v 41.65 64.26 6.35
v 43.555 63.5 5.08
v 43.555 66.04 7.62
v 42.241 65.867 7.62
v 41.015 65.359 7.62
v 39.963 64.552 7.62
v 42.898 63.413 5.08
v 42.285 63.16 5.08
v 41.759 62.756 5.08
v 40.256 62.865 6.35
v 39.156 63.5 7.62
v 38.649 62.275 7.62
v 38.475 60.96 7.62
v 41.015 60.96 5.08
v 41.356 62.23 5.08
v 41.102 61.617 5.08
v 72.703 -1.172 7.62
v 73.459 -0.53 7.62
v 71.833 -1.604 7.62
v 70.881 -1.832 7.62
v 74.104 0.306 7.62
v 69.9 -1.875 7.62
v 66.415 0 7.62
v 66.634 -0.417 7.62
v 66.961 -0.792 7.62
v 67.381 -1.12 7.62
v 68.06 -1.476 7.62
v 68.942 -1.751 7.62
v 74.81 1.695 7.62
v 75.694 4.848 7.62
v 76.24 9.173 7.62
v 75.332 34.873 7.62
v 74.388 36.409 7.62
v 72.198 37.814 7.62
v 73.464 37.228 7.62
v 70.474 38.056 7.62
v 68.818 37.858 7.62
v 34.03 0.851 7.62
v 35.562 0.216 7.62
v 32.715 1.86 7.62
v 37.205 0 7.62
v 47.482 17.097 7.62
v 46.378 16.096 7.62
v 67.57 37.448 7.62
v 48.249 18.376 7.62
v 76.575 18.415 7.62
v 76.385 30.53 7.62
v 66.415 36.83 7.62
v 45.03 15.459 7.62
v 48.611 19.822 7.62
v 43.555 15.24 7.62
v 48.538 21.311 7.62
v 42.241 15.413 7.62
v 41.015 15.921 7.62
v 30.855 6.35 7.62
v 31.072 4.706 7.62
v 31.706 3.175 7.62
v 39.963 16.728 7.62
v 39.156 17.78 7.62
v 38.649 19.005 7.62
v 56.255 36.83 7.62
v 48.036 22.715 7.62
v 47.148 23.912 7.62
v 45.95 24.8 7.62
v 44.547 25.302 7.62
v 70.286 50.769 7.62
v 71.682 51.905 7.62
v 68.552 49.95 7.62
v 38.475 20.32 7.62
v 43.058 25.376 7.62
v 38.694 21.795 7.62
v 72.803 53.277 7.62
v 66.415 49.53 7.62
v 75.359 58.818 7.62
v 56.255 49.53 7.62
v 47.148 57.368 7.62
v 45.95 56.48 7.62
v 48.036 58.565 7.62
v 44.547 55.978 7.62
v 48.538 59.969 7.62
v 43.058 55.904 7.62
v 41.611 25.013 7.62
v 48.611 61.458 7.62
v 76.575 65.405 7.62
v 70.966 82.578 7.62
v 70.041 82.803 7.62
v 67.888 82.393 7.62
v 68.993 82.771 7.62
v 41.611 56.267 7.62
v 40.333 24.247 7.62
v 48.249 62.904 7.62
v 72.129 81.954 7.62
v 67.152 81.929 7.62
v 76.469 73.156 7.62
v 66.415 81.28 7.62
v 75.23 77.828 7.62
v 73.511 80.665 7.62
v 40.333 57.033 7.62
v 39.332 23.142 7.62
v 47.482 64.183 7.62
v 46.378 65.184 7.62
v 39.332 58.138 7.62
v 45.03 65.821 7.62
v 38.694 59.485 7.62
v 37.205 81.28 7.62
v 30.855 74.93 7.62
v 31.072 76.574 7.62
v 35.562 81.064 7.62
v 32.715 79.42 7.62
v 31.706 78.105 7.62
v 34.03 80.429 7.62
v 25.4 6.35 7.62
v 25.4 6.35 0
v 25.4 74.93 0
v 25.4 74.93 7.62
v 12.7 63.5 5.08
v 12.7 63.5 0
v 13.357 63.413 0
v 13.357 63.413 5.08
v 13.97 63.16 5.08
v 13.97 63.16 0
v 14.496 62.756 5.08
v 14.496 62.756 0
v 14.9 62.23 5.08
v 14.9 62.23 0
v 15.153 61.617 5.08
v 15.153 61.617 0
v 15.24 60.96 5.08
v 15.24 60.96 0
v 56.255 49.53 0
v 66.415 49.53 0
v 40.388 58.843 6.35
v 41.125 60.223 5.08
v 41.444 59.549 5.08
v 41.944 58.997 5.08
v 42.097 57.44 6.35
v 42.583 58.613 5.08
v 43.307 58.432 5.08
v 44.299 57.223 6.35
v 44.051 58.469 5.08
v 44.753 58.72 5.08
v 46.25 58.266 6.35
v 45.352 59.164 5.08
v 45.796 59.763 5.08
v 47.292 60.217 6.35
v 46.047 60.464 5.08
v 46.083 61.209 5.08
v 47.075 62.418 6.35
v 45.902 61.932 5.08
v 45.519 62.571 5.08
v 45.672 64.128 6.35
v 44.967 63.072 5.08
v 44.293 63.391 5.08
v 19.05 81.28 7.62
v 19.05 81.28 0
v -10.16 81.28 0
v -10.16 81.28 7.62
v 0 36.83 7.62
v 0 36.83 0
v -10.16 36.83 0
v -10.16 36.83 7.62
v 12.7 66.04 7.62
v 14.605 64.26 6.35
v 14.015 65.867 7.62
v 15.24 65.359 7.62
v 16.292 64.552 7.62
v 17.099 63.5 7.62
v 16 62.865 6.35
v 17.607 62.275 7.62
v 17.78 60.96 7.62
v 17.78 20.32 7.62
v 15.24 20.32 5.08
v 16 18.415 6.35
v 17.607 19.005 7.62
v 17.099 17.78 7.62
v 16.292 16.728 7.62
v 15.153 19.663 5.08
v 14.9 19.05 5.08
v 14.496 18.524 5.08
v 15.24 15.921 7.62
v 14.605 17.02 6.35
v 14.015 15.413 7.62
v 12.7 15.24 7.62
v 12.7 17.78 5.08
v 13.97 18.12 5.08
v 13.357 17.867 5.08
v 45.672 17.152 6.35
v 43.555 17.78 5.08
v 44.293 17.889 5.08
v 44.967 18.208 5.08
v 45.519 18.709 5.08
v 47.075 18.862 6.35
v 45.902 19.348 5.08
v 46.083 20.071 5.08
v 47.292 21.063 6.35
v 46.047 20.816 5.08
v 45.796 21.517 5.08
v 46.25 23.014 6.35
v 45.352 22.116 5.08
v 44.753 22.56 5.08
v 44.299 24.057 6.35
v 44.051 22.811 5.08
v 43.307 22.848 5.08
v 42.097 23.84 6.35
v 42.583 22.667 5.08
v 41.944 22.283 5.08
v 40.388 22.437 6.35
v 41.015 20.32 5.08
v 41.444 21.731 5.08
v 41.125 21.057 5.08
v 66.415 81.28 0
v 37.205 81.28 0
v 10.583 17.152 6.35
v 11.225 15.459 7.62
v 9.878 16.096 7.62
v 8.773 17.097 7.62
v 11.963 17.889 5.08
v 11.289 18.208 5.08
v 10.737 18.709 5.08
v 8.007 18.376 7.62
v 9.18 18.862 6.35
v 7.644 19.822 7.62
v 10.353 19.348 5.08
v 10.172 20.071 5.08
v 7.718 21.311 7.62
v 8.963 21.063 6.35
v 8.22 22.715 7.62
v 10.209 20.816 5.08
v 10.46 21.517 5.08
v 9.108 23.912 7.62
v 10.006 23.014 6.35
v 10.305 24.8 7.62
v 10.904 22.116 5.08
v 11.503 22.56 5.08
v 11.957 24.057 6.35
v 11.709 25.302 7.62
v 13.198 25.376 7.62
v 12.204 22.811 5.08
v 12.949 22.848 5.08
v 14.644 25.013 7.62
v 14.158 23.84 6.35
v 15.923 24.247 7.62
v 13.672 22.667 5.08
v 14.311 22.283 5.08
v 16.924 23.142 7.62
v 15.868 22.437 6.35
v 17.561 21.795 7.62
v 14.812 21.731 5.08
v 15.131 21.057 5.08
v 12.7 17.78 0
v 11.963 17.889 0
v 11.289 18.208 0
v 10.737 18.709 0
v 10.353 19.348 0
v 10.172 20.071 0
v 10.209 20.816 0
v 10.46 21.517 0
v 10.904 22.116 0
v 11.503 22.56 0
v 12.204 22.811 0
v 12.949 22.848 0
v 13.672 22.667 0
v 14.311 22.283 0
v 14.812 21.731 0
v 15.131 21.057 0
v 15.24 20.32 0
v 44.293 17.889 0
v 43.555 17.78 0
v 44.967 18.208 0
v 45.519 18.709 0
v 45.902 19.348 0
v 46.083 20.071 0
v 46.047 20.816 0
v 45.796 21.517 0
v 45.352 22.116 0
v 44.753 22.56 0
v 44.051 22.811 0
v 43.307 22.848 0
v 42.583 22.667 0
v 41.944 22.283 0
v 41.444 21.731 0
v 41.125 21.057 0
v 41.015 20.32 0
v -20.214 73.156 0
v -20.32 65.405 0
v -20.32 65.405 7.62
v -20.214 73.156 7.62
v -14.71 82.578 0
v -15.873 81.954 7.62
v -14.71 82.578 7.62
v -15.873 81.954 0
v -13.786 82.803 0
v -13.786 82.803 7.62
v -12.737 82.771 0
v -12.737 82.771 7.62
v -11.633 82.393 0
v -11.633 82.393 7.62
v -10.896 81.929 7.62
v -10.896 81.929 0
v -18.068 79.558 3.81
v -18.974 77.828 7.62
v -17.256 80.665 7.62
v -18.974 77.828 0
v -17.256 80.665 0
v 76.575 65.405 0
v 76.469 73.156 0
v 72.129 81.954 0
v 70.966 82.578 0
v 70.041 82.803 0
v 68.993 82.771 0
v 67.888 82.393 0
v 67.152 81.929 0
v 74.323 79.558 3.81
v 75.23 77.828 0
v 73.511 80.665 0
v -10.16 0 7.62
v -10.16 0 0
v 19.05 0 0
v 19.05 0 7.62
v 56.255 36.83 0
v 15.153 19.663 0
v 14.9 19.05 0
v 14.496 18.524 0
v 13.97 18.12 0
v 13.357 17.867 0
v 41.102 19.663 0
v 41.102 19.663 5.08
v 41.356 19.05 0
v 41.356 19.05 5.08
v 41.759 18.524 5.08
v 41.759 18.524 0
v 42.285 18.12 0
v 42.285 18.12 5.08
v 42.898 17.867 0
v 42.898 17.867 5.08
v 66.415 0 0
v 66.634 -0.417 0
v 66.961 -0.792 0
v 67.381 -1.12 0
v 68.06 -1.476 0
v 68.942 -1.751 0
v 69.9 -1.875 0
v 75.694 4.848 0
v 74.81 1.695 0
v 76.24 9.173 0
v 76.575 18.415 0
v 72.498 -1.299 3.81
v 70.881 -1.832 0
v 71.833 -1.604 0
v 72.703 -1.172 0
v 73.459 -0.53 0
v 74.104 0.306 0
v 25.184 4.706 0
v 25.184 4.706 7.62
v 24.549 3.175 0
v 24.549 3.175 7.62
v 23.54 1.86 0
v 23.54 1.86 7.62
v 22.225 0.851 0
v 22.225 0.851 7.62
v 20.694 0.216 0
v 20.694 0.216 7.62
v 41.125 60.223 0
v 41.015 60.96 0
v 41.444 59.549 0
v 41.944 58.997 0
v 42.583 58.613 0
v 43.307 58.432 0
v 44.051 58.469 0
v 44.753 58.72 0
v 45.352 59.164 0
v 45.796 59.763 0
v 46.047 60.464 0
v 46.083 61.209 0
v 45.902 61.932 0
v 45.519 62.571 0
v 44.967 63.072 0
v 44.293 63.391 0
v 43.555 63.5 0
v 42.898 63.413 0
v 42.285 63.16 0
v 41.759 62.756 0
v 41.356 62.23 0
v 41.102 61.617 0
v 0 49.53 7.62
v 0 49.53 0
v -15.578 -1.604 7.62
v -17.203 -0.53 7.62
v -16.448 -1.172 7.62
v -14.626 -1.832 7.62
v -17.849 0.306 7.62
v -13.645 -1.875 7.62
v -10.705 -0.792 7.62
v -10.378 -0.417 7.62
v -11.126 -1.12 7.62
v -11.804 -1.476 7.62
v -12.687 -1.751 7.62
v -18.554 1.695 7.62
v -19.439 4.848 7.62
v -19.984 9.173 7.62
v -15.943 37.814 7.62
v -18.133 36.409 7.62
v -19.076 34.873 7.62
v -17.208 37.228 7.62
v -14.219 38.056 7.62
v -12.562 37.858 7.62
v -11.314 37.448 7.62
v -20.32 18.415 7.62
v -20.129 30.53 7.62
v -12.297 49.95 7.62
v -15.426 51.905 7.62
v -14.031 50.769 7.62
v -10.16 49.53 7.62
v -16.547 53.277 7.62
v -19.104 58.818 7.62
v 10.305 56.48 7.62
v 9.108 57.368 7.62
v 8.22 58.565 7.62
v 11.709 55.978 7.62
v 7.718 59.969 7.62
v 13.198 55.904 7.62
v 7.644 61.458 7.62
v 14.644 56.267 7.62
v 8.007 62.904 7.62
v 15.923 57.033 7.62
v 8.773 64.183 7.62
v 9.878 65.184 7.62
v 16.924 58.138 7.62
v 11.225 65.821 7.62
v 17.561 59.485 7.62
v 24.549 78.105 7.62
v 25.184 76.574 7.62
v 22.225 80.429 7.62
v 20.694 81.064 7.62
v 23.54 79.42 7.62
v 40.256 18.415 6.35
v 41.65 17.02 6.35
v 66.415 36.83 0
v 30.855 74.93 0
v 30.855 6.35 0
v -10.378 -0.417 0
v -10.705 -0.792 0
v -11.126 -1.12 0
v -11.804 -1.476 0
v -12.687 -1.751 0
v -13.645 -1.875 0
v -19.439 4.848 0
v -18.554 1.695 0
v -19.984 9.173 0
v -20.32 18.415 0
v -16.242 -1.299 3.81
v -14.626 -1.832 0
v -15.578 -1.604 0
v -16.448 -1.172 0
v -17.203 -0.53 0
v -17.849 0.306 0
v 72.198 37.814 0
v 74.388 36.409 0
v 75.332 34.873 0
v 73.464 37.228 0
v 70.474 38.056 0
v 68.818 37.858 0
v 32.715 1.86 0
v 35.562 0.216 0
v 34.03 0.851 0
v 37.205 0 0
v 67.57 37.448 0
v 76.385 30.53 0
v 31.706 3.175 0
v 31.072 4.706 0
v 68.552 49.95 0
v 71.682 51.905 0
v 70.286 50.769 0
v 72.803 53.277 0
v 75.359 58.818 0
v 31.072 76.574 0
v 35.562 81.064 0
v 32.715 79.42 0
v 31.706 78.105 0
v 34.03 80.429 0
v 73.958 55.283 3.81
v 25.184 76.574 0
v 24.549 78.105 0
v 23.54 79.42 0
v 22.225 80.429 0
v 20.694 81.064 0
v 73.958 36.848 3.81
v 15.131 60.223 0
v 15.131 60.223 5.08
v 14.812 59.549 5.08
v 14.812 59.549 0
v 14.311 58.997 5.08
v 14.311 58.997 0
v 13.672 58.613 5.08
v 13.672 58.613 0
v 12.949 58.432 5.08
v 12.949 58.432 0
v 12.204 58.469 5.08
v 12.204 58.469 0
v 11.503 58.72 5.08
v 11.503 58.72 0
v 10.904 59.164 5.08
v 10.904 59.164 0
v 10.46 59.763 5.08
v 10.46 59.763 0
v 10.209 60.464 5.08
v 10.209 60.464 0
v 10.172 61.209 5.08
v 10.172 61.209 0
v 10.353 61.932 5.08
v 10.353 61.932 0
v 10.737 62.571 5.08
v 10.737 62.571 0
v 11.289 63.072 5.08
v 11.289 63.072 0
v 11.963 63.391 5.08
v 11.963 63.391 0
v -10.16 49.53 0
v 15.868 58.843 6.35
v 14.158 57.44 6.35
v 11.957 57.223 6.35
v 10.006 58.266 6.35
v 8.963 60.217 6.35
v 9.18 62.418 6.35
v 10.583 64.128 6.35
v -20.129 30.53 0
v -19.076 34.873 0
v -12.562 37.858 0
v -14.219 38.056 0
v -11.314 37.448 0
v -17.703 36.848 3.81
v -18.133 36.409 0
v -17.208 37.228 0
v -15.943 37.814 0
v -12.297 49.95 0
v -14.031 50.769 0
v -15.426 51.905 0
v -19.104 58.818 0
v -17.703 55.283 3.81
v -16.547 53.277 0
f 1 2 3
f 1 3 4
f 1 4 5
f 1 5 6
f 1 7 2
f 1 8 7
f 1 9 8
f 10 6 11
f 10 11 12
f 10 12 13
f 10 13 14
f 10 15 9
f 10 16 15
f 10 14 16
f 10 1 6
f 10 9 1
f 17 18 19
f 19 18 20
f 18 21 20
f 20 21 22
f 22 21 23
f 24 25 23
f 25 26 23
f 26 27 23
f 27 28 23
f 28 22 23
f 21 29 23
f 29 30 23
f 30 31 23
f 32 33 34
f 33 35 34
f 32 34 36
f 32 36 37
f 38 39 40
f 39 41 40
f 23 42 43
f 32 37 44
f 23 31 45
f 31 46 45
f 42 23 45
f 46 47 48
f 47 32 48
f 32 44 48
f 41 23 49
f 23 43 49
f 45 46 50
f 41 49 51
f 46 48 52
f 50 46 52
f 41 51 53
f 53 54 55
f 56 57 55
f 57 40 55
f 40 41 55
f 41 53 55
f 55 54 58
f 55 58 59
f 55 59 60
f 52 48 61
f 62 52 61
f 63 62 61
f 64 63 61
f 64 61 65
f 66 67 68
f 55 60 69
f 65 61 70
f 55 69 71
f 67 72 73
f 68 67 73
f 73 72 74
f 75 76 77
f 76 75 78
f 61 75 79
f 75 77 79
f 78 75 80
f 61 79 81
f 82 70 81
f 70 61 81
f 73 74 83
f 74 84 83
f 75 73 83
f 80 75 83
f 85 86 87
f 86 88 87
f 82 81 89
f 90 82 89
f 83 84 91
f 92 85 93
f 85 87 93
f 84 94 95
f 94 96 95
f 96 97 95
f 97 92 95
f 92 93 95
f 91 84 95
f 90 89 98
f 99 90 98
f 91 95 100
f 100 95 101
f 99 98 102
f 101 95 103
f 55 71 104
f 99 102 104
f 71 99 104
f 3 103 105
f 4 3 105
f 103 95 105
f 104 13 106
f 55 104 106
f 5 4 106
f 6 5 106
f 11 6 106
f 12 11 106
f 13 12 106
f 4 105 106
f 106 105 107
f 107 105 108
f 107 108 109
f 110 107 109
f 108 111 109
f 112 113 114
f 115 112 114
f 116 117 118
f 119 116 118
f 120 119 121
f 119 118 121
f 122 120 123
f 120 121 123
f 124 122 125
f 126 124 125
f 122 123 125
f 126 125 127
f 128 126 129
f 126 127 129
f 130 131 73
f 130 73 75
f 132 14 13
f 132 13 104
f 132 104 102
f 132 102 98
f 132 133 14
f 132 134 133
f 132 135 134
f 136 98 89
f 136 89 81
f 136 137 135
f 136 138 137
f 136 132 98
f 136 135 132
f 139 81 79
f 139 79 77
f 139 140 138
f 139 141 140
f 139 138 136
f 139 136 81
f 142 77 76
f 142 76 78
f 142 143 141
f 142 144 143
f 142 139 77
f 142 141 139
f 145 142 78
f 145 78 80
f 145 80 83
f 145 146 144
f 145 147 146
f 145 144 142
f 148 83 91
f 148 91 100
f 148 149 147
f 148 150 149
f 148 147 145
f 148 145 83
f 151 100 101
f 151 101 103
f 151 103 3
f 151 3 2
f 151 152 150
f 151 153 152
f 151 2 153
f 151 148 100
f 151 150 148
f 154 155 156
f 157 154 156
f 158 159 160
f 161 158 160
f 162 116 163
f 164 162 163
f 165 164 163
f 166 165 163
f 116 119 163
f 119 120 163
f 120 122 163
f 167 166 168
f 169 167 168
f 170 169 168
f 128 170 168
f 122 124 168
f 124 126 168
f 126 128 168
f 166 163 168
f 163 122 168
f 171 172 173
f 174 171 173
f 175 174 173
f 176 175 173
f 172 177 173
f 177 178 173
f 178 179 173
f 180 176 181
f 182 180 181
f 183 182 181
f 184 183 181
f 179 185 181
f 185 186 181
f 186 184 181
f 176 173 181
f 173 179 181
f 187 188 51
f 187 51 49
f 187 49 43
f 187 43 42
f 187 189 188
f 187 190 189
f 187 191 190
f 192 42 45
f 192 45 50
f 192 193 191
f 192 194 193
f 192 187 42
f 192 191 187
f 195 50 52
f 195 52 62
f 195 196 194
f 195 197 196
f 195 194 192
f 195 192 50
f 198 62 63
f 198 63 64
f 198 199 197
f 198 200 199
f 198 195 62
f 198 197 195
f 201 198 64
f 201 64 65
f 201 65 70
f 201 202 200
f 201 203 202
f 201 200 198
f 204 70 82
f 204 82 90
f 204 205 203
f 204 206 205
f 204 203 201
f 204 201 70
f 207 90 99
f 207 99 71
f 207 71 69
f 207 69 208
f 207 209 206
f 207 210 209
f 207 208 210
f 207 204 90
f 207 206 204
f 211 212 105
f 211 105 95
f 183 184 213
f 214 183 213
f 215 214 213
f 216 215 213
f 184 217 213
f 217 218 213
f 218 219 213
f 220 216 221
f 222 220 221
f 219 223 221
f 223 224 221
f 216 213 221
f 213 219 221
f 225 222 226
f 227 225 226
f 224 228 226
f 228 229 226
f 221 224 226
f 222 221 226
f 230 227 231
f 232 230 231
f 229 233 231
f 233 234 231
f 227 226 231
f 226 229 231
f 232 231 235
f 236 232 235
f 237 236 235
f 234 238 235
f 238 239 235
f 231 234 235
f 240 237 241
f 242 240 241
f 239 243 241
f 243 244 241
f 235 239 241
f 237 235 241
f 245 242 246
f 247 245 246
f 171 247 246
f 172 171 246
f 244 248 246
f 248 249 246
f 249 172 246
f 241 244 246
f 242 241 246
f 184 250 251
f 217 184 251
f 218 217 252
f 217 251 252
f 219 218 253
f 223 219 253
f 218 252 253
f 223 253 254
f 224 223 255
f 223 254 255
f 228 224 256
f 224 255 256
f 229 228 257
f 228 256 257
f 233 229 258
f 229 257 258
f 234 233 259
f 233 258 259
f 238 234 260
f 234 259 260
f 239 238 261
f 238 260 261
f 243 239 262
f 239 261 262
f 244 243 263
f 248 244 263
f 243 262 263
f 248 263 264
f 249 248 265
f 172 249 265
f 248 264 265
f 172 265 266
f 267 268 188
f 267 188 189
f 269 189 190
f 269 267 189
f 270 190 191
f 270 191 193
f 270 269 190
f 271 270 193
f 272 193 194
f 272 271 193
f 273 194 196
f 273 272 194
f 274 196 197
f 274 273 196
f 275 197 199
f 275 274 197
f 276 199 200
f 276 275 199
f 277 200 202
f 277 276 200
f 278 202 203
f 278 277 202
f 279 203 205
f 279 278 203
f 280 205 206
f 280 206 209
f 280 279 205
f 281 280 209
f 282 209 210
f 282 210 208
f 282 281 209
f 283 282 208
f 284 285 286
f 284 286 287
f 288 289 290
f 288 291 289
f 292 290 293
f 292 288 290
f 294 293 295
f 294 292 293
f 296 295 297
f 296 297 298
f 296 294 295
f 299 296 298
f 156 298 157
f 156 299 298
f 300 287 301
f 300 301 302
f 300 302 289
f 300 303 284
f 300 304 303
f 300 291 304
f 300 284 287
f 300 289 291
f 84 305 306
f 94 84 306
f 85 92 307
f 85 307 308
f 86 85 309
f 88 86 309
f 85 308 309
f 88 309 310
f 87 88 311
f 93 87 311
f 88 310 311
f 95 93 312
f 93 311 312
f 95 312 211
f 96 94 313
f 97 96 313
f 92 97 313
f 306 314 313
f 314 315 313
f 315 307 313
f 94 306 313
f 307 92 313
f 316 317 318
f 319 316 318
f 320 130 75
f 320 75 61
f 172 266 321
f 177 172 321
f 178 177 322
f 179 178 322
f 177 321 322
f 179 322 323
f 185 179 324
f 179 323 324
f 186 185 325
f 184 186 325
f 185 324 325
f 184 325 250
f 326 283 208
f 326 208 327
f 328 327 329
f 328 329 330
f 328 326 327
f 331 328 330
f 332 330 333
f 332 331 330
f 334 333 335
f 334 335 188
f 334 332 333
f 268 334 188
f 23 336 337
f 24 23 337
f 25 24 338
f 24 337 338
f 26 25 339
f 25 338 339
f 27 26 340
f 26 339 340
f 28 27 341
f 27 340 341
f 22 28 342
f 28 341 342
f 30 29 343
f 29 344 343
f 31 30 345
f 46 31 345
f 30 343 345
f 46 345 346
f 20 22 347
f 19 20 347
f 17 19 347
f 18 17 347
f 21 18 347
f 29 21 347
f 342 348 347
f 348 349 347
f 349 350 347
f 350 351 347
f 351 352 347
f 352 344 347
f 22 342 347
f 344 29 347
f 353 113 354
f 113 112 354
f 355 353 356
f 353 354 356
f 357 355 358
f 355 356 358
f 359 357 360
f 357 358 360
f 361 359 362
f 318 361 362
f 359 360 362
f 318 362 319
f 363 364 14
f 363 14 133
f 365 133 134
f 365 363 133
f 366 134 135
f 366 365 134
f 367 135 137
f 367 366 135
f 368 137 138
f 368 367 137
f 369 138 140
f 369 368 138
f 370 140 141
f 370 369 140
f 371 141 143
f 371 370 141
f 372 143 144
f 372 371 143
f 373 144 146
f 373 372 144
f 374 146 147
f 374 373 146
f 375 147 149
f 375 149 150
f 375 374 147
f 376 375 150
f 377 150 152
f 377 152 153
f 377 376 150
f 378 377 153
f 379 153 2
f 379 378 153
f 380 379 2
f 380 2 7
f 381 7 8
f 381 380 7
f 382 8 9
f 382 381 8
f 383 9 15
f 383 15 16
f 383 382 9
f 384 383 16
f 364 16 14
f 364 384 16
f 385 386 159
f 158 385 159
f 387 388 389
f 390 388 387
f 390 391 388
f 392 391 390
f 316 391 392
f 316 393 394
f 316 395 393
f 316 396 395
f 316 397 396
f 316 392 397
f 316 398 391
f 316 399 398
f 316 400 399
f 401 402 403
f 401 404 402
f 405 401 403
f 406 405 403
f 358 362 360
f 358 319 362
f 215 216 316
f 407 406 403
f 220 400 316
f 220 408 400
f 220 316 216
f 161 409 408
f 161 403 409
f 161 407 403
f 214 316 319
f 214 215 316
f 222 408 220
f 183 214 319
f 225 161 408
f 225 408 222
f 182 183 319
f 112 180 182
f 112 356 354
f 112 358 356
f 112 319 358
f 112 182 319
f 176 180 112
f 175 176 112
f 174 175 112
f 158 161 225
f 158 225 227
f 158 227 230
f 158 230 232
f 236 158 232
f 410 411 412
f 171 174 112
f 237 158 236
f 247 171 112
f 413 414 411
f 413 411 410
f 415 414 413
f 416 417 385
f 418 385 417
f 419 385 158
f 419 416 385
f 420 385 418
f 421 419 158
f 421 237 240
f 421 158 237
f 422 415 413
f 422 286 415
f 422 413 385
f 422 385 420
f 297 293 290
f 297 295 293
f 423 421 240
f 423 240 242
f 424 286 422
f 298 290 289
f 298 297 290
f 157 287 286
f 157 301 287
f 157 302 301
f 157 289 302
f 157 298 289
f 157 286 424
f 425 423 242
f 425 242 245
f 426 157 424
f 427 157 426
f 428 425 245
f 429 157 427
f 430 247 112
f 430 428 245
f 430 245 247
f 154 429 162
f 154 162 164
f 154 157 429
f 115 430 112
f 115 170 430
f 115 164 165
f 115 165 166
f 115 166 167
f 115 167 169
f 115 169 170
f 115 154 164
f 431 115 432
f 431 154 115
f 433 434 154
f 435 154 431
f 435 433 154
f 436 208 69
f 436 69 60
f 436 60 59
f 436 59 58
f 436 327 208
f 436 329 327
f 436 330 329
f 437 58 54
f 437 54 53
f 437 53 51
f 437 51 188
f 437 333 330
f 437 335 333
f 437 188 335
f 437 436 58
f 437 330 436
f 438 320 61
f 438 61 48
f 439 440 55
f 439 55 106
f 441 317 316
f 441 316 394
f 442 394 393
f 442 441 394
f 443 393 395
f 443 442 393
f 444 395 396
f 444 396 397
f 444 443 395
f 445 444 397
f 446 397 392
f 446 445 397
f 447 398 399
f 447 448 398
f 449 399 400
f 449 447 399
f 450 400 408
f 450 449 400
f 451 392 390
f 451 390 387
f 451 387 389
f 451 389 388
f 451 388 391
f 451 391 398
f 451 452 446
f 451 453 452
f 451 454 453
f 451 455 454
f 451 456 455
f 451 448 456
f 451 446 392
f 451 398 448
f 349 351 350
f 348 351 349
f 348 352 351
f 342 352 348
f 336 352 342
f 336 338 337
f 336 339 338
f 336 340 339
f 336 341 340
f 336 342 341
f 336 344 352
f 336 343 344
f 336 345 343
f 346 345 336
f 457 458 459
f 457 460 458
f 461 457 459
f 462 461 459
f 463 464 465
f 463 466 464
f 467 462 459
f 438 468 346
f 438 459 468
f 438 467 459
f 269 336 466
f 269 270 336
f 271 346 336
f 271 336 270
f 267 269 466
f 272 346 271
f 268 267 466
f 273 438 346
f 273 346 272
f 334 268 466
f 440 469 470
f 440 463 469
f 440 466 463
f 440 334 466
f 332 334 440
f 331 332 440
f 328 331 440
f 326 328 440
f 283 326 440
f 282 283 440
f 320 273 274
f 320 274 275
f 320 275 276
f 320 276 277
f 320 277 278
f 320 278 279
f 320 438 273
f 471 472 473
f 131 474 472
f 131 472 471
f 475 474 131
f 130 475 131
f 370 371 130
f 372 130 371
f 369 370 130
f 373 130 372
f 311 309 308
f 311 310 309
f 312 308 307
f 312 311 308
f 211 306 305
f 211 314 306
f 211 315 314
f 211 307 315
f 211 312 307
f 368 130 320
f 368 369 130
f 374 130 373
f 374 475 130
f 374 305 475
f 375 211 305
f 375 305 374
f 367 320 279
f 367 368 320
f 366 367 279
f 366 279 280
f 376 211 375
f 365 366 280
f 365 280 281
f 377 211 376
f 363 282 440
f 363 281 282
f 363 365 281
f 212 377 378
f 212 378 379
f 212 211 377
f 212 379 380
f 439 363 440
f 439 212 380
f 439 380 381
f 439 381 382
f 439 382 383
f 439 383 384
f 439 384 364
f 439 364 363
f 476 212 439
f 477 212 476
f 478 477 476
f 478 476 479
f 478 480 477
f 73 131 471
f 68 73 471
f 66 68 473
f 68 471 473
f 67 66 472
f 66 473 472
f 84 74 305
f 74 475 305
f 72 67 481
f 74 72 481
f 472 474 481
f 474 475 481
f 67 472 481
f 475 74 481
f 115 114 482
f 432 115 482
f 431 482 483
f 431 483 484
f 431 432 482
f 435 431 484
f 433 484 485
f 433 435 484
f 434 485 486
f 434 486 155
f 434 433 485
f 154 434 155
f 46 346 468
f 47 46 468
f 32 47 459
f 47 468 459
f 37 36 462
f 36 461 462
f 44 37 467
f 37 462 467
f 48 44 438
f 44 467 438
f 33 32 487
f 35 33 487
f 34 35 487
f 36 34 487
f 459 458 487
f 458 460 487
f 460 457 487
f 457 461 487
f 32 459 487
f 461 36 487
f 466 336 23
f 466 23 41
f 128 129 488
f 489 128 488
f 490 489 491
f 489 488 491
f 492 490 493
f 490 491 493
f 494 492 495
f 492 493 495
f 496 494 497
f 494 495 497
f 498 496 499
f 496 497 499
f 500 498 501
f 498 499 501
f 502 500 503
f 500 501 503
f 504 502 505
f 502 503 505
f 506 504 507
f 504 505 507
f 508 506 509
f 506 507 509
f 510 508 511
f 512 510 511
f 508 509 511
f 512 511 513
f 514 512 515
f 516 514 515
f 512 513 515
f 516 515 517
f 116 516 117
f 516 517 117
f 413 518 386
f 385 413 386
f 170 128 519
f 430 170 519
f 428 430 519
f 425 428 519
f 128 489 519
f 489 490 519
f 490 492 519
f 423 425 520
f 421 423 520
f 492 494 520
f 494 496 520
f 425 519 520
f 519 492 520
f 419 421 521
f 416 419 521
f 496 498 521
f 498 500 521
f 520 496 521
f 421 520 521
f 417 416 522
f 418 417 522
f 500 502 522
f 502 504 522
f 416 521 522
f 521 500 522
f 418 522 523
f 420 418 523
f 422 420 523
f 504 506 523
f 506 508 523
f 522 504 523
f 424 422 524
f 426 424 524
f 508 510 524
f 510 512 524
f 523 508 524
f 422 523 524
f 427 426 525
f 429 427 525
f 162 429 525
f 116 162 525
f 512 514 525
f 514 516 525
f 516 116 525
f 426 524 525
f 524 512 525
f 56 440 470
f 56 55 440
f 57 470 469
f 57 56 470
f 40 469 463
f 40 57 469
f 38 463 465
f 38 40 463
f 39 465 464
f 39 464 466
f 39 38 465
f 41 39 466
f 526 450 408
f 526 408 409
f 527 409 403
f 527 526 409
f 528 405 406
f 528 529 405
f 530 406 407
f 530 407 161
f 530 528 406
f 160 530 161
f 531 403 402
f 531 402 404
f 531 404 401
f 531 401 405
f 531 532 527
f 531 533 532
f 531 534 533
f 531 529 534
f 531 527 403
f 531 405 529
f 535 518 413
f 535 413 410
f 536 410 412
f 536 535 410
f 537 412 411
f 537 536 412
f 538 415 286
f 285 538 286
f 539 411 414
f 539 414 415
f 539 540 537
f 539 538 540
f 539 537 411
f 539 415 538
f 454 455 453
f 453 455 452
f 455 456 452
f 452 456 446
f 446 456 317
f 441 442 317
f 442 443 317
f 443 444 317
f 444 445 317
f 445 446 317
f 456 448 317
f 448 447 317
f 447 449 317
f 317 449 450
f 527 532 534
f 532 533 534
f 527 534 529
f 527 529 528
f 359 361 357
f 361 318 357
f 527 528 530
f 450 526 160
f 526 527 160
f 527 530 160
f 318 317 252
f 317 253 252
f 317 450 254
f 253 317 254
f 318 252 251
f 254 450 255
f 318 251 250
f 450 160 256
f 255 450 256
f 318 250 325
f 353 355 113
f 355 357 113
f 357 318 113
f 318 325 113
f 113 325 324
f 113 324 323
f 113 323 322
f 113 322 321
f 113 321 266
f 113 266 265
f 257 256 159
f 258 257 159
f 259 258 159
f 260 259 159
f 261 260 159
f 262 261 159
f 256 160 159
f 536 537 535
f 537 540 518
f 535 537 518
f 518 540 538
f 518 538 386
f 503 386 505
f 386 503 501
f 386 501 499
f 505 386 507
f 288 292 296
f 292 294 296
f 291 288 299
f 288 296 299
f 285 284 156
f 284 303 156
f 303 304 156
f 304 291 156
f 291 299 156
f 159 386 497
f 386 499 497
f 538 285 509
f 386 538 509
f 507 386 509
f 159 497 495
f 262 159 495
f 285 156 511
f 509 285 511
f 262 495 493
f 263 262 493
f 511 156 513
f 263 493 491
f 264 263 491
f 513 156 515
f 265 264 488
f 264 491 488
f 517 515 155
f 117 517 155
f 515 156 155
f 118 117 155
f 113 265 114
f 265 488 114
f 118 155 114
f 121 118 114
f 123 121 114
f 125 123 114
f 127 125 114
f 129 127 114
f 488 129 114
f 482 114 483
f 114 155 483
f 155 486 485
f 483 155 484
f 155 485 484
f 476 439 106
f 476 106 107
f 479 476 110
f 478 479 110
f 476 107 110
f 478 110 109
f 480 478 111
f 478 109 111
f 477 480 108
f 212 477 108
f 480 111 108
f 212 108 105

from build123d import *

# Parameters (mm, degrees)
F1_DEPTH = 7.62
F2_R     = 6.35
F3_SIZE  = 2.54


with BuildPart() as f1:
    # F0 (on Top) → F1 (new body)
    with BuildSketch(Plane.XY):
        Polygon((0, 18.415), (0, 0), (12.7, 0), (25.4, 0), (25.4, 81.28), (12.7, 81.28), (0, 81.28), (0, 65.405), (0, 49.53), (0, 36.83), align=None)
        with BuildLine():
            ThreePointArc((15.24, 20.32), (14.4960512242, 18.5239487758), (12.7, 17.78))
            ThreePointArc((12.7, 17.78), (10.9039487758, 22.1160512242), (15.24, 20.32))
        make_face(mode=Mode.SUBTRACT)
        with BuildLine():
            ThreePointArc((15.24, 60.96), (10.9039487758, 59.1639487758), (12.7, 63.5))
            ThreePointArc((12.7, 63.5), (14.4960512242, 62.7560512242), (15.24, 60.96))
        make_face(mode=Mode.SUBTRACT)
        with BuildLine():
            Line((-10.16, 49.53), (0, 49.53))
            Line((0, 49.53), (0, 65.405))
            Line((0, 65.405), (-20.32, 65.405))
            add(Edge.make_bspline(
                [(-10.16, 49.53), (-14.331649676, 49.8729012967), (-18.3920992899, 55.1877378663), (-19.9701763147, 61.4448046081), (-20.32, 65.405)],
                knots=[0, 0, 0, 0, 0.2379462848, 0.4877519456, 0.4877519456, 0.4877519456, 0.4877519456], degree=3))
        make_face()
        with BuildLine():
            Line((-20.32, 65.405), (0, 65.405))
            Line((0, 65.405), (0, 81.28))
            Line((0, 81.28), (-10.16, 81.28))
            add(Edge.make_bspline(
                [(-20.32, 65.405), (-20.7295661244, 70.0415124684), (-20.3463914547, 79.9762511033), (-13.1395673379, 84.3035876751), (-10.16, 81.28)],
                knots=[0.4877519456, 0.4877519456, 0.4877519456, 0.4877519456, 0.780219096, 1, 1, 1, 1], degree=3))
        make_face()
        with BuildLine():
            Line((-20.32, 18.415), (0, 18.415))
            Line((0, 18.415), (0, 36.83))
            Line((0, 36.83), (-10.16, 36.83))
            add(Edge.make_bspline(
                [(-20.32, 18.415), (-20.4827266675, 26.5430610833), (-20.9380249073, 38.955794752), (-12.4576338451, 38.3399460251), (-10.16, 36.83)],
                knots=[0.4971306325, 0.4971306325, 0.4971306325, 0.4971306325, 0.8044152788, 1, 1, 1, 1], degree=3))
        make_face()
        with BuildLine():
            Line((-10.16, 0), (0, 0))
            Line((0, 0), (0, 18.415))
            Line((0, 18.415), (-20.32, 18.415))
            add(Edge.make_bspline(
                [(-10.16, 0), (-10.7667939737, -1.6637903173), (-20.0818121137, -4.1002458839), (-20.1507904755, 9.9631256242), (-20.32, 18.415)],
                knots=[0, 0, 0, 0, 0.1776040933, 0.4971306325, 0.4971306325, 0.4971306325, 0.4971306325], degree=3))
        make_face()
    extrude(amount=F1_DEPTH)

    # F2
    f2_edges = [f1.edges().sort_by_distance(p)[0] for p in [
        (25.4, 0, 3.81),
        (25.4, 81.28, 3.81),
    ]]
    fillet(f2_edges, radius=F2_R)

    # F3
    f3_edges = [f1.edges().sort_by_distance(p)[0] for p in [
        (10.16, 60.96, 7.62),
        (12.7, 22.86, 7.62),
    ]]
    chamfer(f3_edges, length=F3_SIZE)


with BuildPart() as f6_1:
    # F6: instance of F1
    add(f1.part.mirror(Plane(origin=(28.1277354807, 41.8248549104, 12.7), x_dir=(0, 1, 0), z_dir=(1, 0, 0))))


solid = Compound([f1.part, f6_1.part])
